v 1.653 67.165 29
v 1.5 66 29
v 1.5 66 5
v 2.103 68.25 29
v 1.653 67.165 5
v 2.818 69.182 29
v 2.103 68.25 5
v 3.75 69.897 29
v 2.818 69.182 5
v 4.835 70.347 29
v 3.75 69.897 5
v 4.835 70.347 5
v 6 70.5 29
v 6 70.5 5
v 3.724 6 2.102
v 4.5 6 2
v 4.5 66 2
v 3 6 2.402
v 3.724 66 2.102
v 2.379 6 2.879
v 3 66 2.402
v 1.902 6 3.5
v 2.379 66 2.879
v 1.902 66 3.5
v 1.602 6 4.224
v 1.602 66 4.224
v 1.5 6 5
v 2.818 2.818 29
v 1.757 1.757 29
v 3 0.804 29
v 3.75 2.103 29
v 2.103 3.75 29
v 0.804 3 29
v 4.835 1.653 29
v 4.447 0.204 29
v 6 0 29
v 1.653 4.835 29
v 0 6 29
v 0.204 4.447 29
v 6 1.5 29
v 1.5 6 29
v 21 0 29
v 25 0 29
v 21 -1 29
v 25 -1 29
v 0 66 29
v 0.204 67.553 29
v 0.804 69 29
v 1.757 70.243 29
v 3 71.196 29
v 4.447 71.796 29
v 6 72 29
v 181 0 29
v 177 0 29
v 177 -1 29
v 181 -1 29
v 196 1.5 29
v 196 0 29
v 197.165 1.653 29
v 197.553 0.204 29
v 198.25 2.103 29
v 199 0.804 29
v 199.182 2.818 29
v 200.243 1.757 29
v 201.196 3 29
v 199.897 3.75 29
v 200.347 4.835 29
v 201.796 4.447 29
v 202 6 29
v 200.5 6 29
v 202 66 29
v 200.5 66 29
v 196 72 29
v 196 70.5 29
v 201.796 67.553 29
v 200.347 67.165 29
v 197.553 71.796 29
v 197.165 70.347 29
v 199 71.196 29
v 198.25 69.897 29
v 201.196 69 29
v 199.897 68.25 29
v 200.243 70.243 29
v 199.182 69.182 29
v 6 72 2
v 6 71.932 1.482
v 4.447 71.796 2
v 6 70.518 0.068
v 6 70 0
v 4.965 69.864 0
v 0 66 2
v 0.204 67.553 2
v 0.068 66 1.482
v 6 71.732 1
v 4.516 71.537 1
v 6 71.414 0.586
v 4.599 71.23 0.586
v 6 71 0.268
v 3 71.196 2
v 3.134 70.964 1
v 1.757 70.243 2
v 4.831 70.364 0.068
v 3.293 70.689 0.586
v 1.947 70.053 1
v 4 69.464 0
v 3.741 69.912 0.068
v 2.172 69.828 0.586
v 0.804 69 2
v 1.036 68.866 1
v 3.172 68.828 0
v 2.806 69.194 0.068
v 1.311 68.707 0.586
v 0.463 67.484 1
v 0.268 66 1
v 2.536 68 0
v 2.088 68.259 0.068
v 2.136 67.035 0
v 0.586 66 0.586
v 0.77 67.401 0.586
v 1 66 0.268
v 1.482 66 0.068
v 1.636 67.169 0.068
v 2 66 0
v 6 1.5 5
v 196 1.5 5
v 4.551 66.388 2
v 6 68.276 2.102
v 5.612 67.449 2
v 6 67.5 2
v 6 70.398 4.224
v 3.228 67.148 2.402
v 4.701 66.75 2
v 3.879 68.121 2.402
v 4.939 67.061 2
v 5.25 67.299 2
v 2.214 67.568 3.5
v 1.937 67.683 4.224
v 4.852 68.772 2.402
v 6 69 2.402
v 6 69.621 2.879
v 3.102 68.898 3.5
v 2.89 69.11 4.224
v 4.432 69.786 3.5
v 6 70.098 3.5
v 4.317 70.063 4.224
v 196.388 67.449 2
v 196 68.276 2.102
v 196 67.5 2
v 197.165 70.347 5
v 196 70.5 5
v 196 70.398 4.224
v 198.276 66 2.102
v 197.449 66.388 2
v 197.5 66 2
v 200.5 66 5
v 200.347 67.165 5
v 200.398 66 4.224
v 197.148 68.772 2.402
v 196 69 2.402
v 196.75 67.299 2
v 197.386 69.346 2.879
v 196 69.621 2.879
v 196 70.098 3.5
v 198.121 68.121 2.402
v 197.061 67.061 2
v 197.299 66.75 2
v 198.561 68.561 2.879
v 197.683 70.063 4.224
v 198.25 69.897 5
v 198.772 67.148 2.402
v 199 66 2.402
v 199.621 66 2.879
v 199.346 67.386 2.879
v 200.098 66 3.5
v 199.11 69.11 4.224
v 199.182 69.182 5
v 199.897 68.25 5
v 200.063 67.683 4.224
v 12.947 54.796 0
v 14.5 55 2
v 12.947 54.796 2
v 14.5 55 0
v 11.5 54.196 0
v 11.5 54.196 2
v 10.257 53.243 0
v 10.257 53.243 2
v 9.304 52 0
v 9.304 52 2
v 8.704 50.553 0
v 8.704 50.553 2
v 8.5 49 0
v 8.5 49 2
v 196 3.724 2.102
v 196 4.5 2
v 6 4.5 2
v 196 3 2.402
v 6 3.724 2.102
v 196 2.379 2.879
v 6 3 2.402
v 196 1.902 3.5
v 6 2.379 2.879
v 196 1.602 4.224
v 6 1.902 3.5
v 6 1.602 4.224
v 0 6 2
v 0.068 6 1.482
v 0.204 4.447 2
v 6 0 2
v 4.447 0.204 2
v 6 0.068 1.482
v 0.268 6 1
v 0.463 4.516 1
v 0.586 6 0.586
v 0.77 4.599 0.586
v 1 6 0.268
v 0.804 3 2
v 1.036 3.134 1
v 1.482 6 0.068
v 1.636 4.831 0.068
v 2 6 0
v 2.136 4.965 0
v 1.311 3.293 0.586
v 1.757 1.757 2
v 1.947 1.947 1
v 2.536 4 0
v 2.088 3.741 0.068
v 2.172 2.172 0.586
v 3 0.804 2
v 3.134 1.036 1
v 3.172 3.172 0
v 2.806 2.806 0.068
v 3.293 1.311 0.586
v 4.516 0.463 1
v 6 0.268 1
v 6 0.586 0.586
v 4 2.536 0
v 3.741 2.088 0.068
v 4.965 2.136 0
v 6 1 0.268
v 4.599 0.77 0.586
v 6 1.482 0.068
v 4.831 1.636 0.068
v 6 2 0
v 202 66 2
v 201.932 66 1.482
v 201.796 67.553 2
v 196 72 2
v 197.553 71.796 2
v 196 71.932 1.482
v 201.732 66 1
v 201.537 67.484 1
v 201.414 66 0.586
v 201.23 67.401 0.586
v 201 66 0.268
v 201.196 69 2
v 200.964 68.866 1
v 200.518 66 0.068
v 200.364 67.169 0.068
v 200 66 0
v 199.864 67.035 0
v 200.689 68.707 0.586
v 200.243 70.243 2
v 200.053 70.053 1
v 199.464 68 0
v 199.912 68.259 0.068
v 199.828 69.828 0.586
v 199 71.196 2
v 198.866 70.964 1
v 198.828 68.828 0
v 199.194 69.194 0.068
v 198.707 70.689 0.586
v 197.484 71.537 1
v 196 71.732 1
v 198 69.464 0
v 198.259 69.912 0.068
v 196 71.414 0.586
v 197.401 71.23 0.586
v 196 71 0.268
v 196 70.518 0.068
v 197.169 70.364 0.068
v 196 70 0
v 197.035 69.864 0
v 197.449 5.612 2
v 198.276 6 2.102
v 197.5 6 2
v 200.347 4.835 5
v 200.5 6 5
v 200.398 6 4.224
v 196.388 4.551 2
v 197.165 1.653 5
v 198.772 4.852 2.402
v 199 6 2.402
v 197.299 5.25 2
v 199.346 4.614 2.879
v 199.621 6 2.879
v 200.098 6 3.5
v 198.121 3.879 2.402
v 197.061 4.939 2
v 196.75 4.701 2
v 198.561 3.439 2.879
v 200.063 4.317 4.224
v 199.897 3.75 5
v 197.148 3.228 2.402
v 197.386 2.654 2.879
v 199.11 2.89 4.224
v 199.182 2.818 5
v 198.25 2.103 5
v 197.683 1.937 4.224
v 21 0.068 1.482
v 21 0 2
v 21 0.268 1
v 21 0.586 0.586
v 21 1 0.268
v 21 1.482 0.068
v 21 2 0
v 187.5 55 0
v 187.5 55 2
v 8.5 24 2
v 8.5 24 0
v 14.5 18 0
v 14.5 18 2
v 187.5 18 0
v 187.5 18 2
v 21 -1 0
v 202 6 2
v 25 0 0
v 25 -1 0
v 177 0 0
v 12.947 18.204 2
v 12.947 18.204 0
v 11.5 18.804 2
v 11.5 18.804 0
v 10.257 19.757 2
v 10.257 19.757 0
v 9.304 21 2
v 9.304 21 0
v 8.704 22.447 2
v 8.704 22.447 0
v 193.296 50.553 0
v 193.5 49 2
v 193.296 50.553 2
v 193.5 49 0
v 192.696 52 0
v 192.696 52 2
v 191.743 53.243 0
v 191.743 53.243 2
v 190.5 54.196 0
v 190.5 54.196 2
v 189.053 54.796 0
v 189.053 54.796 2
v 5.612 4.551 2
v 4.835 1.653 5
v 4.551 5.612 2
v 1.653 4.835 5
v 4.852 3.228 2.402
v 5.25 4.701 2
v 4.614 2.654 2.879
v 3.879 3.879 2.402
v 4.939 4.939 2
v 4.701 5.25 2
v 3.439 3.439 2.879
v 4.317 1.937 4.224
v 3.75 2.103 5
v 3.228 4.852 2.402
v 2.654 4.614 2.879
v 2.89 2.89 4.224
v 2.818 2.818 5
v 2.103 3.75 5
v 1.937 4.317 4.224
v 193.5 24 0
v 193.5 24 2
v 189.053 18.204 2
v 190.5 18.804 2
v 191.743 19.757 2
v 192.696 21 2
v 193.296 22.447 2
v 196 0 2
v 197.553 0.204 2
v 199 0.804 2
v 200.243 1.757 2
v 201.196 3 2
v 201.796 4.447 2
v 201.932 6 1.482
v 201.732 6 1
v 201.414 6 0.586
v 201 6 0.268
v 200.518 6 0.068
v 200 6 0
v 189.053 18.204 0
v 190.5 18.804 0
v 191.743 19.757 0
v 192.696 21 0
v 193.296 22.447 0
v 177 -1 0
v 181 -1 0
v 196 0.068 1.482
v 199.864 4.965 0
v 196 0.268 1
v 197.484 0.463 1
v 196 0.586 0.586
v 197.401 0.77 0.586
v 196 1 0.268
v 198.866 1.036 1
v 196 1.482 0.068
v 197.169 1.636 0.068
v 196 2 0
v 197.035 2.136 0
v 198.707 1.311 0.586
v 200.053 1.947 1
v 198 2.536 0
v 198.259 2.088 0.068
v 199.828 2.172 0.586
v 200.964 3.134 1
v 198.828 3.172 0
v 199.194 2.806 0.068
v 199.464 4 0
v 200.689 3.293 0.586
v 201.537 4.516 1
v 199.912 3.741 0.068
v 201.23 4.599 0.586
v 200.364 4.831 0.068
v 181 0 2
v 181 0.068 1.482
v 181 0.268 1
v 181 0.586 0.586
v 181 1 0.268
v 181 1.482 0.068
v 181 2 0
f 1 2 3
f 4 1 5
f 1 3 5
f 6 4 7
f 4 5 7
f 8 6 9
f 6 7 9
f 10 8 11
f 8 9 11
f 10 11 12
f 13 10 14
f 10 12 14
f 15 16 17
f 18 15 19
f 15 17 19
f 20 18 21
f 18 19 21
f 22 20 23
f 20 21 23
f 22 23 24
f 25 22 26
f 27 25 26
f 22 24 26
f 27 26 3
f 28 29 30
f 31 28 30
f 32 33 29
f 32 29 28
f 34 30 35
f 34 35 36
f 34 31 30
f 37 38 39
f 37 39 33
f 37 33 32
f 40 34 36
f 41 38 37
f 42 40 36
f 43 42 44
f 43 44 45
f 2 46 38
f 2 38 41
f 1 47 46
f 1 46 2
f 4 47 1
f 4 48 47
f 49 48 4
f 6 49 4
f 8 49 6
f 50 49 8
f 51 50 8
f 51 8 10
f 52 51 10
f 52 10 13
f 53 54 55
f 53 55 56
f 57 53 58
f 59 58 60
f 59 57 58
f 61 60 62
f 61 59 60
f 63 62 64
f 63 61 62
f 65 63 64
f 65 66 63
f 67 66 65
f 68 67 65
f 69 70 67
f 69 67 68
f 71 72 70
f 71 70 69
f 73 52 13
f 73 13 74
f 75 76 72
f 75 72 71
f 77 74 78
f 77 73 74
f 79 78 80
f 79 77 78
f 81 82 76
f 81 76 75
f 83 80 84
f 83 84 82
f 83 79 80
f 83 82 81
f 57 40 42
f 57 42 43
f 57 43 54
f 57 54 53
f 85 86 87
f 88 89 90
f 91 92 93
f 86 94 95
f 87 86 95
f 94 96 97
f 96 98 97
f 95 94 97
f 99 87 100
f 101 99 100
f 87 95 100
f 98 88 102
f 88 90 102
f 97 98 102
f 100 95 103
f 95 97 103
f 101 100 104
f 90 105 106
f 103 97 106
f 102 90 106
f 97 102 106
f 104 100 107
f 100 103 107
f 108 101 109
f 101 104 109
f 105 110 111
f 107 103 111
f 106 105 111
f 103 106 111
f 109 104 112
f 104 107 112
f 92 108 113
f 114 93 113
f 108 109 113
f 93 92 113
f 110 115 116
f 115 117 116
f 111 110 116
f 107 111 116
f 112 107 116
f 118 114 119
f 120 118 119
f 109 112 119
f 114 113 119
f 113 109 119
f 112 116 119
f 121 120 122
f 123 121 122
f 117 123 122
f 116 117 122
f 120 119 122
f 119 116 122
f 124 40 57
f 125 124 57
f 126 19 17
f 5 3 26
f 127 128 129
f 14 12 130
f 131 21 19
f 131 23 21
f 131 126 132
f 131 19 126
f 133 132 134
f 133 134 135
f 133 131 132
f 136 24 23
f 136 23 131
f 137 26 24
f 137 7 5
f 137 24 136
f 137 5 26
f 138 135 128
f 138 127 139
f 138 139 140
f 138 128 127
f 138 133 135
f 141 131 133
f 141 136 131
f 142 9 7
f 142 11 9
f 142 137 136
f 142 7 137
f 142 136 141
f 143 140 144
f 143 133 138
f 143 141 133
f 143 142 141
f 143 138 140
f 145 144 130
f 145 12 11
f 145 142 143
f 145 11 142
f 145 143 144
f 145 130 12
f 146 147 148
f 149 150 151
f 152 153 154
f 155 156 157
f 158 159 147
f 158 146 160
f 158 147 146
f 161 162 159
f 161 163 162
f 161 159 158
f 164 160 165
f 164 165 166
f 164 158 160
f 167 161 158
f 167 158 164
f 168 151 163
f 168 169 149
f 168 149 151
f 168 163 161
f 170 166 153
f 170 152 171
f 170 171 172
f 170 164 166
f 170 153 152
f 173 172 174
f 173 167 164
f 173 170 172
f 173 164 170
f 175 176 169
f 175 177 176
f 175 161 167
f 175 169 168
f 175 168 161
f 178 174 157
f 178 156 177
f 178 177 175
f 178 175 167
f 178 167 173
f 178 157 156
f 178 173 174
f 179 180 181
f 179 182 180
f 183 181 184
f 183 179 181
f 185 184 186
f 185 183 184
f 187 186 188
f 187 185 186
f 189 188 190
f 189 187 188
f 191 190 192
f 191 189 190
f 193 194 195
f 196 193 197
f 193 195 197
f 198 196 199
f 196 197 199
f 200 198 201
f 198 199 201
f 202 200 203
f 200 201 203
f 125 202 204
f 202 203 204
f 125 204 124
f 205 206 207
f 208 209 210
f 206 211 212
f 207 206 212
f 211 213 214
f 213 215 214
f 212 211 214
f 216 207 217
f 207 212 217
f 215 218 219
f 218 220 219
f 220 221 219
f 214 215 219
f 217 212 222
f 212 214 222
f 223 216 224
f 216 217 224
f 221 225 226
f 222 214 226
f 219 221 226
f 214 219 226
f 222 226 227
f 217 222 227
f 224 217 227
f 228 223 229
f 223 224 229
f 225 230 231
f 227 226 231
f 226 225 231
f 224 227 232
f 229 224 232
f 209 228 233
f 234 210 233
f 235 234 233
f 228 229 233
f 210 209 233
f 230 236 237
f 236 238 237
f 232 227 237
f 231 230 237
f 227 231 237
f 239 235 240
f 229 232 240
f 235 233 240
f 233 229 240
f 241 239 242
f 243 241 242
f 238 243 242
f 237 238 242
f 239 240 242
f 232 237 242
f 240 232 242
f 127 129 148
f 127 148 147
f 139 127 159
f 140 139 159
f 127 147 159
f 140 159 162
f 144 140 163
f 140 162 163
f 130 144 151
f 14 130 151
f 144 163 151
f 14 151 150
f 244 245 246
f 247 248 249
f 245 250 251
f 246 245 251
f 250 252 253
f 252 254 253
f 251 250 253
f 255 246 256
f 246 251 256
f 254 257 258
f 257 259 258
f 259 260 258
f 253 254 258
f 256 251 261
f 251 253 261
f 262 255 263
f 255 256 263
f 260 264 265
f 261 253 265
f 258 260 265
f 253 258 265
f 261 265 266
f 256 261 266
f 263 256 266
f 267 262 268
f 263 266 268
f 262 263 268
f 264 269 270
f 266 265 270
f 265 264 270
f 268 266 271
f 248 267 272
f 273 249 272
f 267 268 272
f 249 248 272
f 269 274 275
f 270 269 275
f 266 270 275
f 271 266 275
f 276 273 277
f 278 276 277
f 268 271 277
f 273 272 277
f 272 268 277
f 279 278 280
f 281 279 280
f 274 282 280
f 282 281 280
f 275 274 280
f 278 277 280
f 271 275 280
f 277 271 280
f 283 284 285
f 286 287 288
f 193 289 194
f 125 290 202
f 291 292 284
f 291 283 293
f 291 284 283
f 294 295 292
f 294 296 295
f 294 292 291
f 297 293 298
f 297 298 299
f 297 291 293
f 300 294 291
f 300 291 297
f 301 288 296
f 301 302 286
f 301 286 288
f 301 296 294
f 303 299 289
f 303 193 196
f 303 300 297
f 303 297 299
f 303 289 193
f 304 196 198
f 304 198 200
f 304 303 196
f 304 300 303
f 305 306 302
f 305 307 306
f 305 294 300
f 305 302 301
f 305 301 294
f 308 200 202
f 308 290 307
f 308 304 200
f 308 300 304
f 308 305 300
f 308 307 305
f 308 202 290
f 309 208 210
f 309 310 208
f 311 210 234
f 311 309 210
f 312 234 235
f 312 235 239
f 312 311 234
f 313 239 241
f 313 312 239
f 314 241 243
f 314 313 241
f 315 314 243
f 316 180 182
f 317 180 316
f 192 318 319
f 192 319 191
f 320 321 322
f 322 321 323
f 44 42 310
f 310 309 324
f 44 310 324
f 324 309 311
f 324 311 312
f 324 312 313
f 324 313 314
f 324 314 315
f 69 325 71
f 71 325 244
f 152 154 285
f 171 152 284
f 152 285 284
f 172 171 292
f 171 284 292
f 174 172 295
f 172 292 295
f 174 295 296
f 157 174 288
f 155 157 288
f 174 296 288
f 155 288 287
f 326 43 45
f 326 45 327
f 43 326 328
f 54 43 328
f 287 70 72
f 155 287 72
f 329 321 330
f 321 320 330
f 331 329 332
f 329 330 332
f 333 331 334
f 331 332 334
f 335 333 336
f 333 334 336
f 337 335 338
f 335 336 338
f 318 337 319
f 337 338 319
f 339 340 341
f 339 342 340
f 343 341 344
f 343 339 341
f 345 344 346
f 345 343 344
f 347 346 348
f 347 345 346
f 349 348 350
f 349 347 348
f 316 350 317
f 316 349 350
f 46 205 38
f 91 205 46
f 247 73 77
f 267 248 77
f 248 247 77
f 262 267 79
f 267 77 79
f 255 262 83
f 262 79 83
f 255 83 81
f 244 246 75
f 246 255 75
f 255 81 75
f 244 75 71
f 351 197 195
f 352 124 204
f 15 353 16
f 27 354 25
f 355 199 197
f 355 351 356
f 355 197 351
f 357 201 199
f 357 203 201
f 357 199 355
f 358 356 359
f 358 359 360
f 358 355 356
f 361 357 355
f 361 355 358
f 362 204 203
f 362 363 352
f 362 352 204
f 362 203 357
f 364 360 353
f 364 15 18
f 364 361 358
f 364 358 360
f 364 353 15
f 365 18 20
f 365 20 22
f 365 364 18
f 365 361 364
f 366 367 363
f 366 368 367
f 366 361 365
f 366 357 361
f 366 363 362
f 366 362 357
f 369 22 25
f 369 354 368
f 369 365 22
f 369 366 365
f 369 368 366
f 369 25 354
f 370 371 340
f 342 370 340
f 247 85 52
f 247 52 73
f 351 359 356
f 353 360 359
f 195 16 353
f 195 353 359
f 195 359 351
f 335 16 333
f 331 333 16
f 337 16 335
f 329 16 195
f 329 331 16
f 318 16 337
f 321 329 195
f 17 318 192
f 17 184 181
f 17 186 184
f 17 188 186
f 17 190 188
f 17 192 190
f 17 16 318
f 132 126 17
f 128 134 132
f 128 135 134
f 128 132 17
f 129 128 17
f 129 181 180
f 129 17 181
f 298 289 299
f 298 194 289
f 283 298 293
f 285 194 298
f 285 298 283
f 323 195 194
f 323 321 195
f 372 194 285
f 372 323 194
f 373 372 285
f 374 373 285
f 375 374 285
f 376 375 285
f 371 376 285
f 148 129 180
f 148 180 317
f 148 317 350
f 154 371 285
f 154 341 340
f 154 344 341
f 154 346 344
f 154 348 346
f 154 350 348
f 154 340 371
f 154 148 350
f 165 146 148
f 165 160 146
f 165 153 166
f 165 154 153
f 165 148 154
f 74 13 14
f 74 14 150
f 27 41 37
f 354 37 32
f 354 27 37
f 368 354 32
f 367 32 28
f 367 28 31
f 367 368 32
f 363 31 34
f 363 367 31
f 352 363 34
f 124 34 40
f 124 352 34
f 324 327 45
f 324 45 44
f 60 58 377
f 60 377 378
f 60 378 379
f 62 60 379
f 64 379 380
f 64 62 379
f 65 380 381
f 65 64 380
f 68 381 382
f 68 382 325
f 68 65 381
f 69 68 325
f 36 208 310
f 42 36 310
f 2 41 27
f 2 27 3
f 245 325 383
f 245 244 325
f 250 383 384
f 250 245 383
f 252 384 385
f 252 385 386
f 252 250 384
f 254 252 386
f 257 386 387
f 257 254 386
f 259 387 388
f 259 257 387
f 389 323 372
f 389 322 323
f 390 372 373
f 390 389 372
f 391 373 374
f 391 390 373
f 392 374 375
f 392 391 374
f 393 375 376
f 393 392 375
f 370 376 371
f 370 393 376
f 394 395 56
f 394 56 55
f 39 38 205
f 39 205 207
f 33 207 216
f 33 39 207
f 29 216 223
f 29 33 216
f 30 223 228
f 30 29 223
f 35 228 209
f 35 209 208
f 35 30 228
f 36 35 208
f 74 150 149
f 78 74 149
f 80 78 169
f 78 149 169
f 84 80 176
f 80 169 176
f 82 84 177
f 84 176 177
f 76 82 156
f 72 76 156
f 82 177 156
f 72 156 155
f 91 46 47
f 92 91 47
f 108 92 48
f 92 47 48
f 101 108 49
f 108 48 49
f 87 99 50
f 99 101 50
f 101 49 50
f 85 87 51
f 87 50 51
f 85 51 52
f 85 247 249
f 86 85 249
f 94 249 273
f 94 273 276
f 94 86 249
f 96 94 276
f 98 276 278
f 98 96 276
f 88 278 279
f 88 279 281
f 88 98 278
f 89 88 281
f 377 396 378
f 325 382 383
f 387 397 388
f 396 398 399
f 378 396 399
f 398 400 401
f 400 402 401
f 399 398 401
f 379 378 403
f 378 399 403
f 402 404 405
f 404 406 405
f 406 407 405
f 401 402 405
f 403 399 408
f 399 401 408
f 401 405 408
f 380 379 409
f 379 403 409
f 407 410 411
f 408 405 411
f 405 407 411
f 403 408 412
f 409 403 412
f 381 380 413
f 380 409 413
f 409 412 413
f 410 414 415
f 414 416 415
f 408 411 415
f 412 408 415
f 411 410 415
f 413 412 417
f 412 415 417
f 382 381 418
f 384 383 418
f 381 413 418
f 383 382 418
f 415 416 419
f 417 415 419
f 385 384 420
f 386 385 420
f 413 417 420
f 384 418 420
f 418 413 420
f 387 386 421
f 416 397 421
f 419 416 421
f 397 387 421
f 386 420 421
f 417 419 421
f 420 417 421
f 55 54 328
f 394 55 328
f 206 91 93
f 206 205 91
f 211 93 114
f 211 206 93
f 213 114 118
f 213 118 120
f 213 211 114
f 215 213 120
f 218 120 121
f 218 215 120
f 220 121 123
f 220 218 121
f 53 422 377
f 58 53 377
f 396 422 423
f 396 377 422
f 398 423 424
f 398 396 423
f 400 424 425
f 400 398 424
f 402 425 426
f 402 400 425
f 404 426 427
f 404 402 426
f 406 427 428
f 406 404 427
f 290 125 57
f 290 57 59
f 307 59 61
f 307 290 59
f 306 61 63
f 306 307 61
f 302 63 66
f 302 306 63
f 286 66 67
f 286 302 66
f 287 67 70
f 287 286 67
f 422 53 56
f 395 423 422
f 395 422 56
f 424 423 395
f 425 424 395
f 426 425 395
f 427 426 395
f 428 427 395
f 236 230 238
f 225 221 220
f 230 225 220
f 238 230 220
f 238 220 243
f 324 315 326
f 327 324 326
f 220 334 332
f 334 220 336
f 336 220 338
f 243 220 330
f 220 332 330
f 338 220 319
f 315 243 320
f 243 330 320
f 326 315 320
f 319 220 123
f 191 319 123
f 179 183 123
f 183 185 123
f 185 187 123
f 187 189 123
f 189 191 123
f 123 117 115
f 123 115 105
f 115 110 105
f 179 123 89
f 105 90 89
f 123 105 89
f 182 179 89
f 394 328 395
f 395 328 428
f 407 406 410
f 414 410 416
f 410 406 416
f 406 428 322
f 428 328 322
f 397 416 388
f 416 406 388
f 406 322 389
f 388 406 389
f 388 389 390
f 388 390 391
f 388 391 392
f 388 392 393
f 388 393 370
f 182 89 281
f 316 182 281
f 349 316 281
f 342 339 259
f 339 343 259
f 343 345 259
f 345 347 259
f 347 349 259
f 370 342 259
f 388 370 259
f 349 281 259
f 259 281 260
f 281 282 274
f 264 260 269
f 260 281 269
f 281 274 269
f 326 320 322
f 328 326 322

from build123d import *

# Parameters (mm, degrees)
SKETCH1_W           = 202
SKETCH1_H           = 72
BOSS_EXTRUDE1_DEPTH = 29
SKETCH2_W           = 199
SKETCH2_H           = 69
CUT_EXTRUDE1_DEPTH  = 27
SKETCH3_W           = 185
SKETCH3_H           = 37
CUT_EXTRUDE2_DEPTH  = 27
FILLET1_R           = 6
FILLET2_R           = 4.5
FILLET3_R           = 6
SKETCH4_W           = 4
SKETCH4_H           = 29
BOSS_EXTRUDE2_DEPTH = 1
FILLET4_R           = 2
FILLET5_R           = 3


with BuildPart() as part:
    # Sketch1 → Boss-Extrude1 (new body)
    with BuildSketch(Plane.XY):
        with Locations((101, 36)):
            Rectangle(SKETCH1_W, SKETCH1_H)
    extrude(amount=BOSS_EXTRUDE1_DEPTH)

    # Sketch2 → Cut-Extrude1 (cut)
    with BuildSketch(Plane.XY.offset(29)):
        with Locations((101, 36)):
            Rectangle(SKETCH2_W, SKETCH2_H)
    extrude(amount=-CUT_EXTRUDE1_DEPTH, mode=Mode.SUBTRACT)

    # Sketch3 → Cut-Extrude2 (cut)
    with BuildSketch(Plane.XY.offset(2)):
        with Locations((101, 36.5)):
            Rectangle(SKETCH3_W, SKETCH3_H)
    extrude(amount=-CUT_EXTRUDE2_DEPTH, mode=Mode.SUBTRACT)

    # Fillet1
    fillet1_edges = [part.edges().sort_by_distance(p)[0] for p in [
        (8.5, 18, 1),
        (8.5, 55, 1),
        (193.5, 55, 1),
        (193.5, 18, 1),
    ]]
    fillet(fillet1_edges, radius=FILLET1_R)

    # Fillet2
    fillet2_edges = [part.edges().sort_by_distance(p)[0] for p in [
        (1.5, 1.5, 15.5),
        (1.5, 70.5, 15.5),
        (200.5, 70.5, 15.5),
        (200.5, 1.5, 15.5),
    ]]
    fillet(fillet2_edges, radius=FILLET2_R)

    # Fillet3
    fillet3_edges = [part.edges().sort_by_distance(p)[0] for p in [
        (0, 72, 14.5),
        (202, 72, 14.5),
        (202, 0, 14.5),
        (0, 0, 14.5),
    ]]
    fillet(fillet3_edges, radius=FILLET3_R)

    # Sketch4 → Boss-Extrude2 (add)
    with BuildSketch(Plane(origin=(0, 0, 0), x_dir=(-1, 0, 0), z_dir=(0, -1, 0))):
        with Locations((-23, -14.5)):
            Rectangle(SKETCH4_W, SKETCH4_H)
        with Locations((-179, -14.5)):
            Rectangle(SKETCH4_W, SKETCH4_H)
    extrude(amount=BOSS_EXTRUDE2_DEPTH)

    # Fillet4
    fillet4_edges = [part.edges().sort_by_distance(p)[0] for p in [
        (200.242640687, 1.757359313, 0),
        (188.5, 0, 0),
        (202, 36, 0),
        (0, 36, 0),
        (101, 72, 0),
        (13.5, 0, 0),
        (1.757359313, 70.242640687, 0),
        (1.757359313, 1.757359313, 0),
        (200.242640687, 70.242640687, 0),
    ]]
    fillet(fillet4_edges, radius=FILLET4_R)

    # Fillet5
    fillet5_edges = [part.edges().sort_by_distance(p)[0] for p in [
        (101, 70.5, 2),
        (200.5, 36, 2),
        (1.5, 36, 2),
        (101, 1.5, 2),
        (2.818019485, 69.181980515, 2),
        (2.818019485, 2.818019485, 2),
        (199.181980515, 2.818019485, 2),
        (199.181980515, 69.181980515, 2),
    ]]
    fillet(fillet5_edges, radius=FILLET5_R)


solid = part.part
